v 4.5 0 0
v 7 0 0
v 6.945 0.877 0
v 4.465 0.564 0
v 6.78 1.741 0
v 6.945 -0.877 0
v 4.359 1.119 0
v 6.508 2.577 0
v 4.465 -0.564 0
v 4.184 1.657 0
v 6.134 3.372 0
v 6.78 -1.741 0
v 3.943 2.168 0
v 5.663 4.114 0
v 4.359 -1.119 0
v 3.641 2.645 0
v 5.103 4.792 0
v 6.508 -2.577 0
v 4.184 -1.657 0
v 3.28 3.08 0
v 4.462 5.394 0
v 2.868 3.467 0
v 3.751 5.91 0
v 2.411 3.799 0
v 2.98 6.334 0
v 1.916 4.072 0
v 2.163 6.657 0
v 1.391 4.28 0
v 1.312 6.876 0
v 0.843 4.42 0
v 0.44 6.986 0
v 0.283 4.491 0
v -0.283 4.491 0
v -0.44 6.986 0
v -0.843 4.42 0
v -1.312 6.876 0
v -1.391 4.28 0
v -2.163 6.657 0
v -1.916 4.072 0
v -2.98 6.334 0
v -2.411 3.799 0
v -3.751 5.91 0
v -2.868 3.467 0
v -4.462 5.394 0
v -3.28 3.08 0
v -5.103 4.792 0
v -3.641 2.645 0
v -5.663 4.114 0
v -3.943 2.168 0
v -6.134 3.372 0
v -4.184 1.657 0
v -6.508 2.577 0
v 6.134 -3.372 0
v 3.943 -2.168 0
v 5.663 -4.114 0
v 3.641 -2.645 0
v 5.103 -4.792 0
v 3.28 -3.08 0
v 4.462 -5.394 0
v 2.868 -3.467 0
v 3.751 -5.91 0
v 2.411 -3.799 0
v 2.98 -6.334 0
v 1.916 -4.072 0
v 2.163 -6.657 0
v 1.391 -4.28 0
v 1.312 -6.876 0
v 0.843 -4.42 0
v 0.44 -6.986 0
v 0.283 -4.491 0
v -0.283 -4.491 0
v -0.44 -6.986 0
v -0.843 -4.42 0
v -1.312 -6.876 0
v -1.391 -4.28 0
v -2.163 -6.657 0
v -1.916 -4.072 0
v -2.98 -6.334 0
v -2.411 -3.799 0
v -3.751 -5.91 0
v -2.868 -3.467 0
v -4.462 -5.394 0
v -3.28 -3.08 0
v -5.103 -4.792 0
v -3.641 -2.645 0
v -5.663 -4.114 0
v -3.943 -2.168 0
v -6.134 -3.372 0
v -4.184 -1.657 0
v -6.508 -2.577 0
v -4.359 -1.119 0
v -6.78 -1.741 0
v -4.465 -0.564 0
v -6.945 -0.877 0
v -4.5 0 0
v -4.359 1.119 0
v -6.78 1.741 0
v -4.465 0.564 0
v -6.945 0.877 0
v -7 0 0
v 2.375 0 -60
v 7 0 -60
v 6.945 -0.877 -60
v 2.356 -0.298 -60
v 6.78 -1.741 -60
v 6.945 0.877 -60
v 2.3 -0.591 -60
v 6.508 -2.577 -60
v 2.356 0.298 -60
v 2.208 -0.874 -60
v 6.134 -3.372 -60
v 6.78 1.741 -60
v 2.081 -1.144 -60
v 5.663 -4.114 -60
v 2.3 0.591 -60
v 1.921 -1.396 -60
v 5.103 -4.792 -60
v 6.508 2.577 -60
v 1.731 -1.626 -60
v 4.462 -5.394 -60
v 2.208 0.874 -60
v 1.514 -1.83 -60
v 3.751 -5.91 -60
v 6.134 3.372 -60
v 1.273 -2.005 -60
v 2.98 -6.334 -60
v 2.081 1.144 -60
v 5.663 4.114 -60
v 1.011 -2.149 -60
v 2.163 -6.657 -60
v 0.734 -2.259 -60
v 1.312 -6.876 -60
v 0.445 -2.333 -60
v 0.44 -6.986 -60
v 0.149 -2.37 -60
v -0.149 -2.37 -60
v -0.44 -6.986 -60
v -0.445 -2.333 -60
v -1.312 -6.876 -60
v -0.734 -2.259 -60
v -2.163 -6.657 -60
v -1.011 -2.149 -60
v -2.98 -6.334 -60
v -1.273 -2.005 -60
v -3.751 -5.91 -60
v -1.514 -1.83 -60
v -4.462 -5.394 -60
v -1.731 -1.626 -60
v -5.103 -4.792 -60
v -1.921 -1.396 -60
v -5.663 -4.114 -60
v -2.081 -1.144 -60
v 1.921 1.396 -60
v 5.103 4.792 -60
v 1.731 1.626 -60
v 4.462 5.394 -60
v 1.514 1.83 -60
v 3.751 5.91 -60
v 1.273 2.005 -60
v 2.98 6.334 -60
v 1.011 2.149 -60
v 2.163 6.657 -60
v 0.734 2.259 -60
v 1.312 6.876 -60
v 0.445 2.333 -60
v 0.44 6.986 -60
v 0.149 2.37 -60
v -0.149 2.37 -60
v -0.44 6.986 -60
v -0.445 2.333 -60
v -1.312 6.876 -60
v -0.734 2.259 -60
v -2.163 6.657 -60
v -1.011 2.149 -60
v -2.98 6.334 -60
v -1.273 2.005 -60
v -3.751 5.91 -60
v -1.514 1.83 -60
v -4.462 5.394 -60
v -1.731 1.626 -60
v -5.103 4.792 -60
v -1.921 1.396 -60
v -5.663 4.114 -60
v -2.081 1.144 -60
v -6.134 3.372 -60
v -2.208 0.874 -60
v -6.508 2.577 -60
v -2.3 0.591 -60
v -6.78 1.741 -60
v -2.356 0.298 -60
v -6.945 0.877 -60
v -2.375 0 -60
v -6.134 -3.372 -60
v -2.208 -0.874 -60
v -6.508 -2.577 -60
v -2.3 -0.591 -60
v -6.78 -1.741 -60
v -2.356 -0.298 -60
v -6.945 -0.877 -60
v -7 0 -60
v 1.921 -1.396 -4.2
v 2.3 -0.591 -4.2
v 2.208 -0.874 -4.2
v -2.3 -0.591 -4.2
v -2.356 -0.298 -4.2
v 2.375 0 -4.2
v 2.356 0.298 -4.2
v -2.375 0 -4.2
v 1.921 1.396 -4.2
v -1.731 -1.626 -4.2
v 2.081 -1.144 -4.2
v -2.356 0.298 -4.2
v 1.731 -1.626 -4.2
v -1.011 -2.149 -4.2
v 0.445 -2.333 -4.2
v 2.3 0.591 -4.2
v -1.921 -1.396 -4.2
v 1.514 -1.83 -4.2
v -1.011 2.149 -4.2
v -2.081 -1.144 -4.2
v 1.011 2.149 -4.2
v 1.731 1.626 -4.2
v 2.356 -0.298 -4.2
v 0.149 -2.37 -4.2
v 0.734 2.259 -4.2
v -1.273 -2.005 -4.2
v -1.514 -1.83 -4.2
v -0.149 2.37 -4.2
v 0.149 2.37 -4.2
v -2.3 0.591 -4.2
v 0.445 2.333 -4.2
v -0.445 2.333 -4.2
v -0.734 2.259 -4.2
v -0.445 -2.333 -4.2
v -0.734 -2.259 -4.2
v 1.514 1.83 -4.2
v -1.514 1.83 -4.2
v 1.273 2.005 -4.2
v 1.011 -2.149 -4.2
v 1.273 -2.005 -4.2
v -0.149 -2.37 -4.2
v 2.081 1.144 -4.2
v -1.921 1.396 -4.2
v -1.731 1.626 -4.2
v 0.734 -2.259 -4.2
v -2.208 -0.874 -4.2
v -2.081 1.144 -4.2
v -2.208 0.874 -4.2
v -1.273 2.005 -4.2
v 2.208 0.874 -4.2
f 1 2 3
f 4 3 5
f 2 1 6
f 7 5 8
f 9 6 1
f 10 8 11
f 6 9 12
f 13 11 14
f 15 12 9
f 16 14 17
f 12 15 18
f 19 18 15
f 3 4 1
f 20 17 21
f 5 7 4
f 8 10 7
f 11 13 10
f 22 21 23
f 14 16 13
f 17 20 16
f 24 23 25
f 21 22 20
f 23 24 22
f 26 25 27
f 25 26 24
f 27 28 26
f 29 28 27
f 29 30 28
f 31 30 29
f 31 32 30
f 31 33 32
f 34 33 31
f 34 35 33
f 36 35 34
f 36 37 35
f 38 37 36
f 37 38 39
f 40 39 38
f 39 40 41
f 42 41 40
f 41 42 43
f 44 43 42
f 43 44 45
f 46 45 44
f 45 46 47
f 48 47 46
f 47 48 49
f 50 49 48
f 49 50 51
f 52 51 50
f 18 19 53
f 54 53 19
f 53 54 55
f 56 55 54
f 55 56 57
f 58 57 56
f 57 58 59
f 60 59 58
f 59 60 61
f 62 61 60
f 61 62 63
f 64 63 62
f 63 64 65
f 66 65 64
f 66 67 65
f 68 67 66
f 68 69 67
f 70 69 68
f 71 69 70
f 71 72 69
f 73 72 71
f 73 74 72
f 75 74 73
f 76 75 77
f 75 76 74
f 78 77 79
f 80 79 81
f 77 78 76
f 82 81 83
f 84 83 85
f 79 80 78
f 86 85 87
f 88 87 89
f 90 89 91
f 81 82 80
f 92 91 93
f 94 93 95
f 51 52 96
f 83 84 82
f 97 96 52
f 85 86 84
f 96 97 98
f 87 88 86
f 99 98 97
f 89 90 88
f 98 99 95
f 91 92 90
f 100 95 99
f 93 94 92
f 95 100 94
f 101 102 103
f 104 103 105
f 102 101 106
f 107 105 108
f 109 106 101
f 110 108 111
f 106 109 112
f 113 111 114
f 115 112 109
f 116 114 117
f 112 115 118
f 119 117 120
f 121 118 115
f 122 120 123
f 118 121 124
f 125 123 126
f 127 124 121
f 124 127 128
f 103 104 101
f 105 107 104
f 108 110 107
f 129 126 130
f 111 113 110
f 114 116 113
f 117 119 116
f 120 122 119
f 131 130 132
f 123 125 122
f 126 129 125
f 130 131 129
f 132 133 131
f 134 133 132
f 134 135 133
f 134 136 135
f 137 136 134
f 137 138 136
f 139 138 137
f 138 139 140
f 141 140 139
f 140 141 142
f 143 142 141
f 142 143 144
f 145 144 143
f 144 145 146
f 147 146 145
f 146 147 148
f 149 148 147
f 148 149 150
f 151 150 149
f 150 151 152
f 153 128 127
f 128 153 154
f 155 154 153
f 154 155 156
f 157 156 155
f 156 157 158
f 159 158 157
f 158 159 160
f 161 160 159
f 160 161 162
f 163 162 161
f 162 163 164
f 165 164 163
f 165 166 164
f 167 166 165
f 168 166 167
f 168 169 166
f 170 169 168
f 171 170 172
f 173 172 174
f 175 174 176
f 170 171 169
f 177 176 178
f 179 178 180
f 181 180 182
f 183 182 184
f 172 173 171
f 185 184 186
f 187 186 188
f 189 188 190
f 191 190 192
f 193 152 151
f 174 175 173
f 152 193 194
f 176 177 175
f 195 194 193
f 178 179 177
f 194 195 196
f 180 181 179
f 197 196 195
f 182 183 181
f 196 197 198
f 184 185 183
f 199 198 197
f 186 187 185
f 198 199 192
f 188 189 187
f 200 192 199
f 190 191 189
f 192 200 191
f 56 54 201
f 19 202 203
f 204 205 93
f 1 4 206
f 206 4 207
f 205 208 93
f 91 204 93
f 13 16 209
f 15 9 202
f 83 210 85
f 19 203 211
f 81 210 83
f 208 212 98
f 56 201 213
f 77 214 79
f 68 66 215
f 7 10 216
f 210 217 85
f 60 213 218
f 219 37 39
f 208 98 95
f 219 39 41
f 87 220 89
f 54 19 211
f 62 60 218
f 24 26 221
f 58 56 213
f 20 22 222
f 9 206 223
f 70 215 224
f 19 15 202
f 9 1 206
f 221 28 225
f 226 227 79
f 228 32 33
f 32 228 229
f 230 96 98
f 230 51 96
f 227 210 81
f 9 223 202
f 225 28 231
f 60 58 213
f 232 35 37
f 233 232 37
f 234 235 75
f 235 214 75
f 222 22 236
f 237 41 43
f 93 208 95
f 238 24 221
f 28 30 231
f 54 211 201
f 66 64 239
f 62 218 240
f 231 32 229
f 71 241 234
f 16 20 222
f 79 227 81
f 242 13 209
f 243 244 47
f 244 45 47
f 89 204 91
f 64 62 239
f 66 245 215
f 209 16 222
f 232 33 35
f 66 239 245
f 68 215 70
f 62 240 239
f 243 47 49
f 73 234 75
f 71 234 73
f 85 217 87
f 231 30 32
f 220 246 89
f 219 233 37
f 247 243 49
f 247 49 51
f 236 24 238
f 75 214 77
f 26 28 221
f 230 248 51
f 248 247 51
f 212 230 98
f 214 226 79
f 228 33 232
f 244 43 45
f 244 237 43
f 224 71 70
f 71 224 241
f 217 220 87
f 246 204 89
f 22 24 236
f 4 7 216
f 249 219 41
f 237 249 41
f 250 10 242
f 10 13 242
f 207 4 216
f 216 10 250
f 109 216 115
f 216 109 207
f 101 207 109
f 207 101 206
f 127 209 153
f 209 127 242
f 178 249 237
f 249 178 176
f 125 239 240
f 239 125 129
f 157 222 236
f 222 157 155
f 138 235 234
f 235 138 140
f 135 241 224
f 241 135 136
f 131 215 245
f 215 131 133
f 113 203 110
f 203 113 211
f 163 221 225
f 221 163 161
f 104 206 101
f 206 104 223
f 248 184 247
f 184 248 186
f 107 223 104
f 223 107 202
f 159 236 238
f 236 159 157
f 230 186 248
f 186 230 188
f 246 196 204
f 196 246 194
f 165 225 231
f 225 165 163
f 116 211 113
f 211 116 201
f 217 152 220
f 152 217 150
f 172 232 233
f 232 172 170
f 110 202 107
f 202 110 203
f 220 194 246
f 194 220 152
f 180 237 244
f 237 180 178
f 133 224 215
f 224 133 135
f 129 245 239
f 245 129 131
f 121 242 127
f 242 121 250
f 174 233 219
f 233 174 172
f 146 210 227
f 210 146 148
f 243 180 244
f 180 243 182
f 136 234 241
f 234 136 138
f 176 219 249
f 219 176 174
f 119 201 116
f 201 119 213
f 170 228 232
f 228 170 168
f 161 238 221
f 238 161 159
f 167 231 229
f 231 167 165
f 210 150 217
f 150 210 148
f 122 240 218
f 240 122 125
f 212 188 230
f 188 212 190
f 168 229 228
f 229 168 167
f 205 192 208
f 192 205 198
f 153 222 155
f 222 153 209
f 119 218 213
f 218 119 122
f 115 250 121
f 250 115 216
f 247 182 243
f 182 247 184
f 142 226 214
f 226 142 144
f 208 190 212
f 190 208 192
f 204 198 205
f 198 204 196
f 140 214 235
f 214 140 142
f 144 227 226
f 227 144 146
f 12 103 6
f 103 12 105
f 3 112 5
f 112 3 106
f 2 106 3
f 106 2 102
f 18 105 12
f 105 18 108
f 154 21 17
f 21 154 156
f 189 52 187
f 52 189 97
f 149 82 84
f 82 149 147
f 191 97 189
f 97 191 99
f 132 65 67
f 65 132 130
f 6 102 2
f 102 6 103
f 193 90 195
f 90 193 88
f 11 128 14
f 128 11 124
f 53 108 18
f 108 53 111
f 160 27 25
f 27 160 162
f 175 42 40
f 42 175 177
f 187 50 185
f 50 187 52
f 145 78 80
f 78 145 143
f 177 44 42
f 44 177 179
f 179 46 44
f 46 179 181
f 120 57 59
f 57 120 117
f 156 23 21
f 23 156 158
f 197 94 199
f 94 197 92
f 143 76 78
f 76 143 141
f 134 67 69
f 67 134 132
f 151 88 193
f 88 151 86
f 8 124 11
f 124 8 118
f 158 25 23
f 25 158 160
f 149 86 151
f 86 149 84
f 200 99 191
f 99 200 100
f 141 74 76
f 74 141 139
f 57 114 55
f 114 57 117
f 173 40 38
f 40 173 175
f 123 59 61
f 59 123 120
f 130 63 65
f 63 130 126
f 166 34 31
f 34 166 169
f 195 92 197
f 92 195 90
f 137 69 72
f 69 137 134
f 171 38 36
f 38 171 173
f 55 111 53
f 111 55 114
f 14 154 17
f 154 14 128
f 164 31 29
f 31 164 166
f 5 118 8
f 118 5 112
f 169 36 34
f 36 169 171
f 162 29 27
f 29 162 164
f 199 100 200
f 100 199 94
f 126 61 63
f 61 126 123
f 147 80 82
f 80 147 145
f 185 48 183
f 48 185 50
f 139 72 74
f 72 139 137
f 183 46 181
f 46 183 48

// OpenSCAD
$fn = 50;


difference() {
	union() {
		translate(v = [0, 0, -60.0000000000]) {
			cylinder(h = 60, r = 7.0000000000);
		}
		cylinder(h = 0, r = 17.0000000000);
	}
	union() {
		translate(v = [0, 0, 0]) {
			rotate(a = [0, 0, 0]) {
				difference() {
					union() {
						#translate(v = [0, 0, -60.0000000000]) {
							cylinder(h = 60, r = 2.2500000000);
						}
						#translate(v = [0, 0, -4.2000000000]) {
							cylinder(h = 4.2000000000, r1 = 2.3750000000, r2 = 4.5000000000);
						}
						#translate(v = [0, 0, -60.0000000000]) {
							cylinder(h = 60, r = 2.3750000000);
						}
						#translate(v = [0, 0, -60.0000000000]) {
							cylinder(h = 60, r = 2.2500000000);
						}
					}
					union();
				}
			}
		}
	}
}
